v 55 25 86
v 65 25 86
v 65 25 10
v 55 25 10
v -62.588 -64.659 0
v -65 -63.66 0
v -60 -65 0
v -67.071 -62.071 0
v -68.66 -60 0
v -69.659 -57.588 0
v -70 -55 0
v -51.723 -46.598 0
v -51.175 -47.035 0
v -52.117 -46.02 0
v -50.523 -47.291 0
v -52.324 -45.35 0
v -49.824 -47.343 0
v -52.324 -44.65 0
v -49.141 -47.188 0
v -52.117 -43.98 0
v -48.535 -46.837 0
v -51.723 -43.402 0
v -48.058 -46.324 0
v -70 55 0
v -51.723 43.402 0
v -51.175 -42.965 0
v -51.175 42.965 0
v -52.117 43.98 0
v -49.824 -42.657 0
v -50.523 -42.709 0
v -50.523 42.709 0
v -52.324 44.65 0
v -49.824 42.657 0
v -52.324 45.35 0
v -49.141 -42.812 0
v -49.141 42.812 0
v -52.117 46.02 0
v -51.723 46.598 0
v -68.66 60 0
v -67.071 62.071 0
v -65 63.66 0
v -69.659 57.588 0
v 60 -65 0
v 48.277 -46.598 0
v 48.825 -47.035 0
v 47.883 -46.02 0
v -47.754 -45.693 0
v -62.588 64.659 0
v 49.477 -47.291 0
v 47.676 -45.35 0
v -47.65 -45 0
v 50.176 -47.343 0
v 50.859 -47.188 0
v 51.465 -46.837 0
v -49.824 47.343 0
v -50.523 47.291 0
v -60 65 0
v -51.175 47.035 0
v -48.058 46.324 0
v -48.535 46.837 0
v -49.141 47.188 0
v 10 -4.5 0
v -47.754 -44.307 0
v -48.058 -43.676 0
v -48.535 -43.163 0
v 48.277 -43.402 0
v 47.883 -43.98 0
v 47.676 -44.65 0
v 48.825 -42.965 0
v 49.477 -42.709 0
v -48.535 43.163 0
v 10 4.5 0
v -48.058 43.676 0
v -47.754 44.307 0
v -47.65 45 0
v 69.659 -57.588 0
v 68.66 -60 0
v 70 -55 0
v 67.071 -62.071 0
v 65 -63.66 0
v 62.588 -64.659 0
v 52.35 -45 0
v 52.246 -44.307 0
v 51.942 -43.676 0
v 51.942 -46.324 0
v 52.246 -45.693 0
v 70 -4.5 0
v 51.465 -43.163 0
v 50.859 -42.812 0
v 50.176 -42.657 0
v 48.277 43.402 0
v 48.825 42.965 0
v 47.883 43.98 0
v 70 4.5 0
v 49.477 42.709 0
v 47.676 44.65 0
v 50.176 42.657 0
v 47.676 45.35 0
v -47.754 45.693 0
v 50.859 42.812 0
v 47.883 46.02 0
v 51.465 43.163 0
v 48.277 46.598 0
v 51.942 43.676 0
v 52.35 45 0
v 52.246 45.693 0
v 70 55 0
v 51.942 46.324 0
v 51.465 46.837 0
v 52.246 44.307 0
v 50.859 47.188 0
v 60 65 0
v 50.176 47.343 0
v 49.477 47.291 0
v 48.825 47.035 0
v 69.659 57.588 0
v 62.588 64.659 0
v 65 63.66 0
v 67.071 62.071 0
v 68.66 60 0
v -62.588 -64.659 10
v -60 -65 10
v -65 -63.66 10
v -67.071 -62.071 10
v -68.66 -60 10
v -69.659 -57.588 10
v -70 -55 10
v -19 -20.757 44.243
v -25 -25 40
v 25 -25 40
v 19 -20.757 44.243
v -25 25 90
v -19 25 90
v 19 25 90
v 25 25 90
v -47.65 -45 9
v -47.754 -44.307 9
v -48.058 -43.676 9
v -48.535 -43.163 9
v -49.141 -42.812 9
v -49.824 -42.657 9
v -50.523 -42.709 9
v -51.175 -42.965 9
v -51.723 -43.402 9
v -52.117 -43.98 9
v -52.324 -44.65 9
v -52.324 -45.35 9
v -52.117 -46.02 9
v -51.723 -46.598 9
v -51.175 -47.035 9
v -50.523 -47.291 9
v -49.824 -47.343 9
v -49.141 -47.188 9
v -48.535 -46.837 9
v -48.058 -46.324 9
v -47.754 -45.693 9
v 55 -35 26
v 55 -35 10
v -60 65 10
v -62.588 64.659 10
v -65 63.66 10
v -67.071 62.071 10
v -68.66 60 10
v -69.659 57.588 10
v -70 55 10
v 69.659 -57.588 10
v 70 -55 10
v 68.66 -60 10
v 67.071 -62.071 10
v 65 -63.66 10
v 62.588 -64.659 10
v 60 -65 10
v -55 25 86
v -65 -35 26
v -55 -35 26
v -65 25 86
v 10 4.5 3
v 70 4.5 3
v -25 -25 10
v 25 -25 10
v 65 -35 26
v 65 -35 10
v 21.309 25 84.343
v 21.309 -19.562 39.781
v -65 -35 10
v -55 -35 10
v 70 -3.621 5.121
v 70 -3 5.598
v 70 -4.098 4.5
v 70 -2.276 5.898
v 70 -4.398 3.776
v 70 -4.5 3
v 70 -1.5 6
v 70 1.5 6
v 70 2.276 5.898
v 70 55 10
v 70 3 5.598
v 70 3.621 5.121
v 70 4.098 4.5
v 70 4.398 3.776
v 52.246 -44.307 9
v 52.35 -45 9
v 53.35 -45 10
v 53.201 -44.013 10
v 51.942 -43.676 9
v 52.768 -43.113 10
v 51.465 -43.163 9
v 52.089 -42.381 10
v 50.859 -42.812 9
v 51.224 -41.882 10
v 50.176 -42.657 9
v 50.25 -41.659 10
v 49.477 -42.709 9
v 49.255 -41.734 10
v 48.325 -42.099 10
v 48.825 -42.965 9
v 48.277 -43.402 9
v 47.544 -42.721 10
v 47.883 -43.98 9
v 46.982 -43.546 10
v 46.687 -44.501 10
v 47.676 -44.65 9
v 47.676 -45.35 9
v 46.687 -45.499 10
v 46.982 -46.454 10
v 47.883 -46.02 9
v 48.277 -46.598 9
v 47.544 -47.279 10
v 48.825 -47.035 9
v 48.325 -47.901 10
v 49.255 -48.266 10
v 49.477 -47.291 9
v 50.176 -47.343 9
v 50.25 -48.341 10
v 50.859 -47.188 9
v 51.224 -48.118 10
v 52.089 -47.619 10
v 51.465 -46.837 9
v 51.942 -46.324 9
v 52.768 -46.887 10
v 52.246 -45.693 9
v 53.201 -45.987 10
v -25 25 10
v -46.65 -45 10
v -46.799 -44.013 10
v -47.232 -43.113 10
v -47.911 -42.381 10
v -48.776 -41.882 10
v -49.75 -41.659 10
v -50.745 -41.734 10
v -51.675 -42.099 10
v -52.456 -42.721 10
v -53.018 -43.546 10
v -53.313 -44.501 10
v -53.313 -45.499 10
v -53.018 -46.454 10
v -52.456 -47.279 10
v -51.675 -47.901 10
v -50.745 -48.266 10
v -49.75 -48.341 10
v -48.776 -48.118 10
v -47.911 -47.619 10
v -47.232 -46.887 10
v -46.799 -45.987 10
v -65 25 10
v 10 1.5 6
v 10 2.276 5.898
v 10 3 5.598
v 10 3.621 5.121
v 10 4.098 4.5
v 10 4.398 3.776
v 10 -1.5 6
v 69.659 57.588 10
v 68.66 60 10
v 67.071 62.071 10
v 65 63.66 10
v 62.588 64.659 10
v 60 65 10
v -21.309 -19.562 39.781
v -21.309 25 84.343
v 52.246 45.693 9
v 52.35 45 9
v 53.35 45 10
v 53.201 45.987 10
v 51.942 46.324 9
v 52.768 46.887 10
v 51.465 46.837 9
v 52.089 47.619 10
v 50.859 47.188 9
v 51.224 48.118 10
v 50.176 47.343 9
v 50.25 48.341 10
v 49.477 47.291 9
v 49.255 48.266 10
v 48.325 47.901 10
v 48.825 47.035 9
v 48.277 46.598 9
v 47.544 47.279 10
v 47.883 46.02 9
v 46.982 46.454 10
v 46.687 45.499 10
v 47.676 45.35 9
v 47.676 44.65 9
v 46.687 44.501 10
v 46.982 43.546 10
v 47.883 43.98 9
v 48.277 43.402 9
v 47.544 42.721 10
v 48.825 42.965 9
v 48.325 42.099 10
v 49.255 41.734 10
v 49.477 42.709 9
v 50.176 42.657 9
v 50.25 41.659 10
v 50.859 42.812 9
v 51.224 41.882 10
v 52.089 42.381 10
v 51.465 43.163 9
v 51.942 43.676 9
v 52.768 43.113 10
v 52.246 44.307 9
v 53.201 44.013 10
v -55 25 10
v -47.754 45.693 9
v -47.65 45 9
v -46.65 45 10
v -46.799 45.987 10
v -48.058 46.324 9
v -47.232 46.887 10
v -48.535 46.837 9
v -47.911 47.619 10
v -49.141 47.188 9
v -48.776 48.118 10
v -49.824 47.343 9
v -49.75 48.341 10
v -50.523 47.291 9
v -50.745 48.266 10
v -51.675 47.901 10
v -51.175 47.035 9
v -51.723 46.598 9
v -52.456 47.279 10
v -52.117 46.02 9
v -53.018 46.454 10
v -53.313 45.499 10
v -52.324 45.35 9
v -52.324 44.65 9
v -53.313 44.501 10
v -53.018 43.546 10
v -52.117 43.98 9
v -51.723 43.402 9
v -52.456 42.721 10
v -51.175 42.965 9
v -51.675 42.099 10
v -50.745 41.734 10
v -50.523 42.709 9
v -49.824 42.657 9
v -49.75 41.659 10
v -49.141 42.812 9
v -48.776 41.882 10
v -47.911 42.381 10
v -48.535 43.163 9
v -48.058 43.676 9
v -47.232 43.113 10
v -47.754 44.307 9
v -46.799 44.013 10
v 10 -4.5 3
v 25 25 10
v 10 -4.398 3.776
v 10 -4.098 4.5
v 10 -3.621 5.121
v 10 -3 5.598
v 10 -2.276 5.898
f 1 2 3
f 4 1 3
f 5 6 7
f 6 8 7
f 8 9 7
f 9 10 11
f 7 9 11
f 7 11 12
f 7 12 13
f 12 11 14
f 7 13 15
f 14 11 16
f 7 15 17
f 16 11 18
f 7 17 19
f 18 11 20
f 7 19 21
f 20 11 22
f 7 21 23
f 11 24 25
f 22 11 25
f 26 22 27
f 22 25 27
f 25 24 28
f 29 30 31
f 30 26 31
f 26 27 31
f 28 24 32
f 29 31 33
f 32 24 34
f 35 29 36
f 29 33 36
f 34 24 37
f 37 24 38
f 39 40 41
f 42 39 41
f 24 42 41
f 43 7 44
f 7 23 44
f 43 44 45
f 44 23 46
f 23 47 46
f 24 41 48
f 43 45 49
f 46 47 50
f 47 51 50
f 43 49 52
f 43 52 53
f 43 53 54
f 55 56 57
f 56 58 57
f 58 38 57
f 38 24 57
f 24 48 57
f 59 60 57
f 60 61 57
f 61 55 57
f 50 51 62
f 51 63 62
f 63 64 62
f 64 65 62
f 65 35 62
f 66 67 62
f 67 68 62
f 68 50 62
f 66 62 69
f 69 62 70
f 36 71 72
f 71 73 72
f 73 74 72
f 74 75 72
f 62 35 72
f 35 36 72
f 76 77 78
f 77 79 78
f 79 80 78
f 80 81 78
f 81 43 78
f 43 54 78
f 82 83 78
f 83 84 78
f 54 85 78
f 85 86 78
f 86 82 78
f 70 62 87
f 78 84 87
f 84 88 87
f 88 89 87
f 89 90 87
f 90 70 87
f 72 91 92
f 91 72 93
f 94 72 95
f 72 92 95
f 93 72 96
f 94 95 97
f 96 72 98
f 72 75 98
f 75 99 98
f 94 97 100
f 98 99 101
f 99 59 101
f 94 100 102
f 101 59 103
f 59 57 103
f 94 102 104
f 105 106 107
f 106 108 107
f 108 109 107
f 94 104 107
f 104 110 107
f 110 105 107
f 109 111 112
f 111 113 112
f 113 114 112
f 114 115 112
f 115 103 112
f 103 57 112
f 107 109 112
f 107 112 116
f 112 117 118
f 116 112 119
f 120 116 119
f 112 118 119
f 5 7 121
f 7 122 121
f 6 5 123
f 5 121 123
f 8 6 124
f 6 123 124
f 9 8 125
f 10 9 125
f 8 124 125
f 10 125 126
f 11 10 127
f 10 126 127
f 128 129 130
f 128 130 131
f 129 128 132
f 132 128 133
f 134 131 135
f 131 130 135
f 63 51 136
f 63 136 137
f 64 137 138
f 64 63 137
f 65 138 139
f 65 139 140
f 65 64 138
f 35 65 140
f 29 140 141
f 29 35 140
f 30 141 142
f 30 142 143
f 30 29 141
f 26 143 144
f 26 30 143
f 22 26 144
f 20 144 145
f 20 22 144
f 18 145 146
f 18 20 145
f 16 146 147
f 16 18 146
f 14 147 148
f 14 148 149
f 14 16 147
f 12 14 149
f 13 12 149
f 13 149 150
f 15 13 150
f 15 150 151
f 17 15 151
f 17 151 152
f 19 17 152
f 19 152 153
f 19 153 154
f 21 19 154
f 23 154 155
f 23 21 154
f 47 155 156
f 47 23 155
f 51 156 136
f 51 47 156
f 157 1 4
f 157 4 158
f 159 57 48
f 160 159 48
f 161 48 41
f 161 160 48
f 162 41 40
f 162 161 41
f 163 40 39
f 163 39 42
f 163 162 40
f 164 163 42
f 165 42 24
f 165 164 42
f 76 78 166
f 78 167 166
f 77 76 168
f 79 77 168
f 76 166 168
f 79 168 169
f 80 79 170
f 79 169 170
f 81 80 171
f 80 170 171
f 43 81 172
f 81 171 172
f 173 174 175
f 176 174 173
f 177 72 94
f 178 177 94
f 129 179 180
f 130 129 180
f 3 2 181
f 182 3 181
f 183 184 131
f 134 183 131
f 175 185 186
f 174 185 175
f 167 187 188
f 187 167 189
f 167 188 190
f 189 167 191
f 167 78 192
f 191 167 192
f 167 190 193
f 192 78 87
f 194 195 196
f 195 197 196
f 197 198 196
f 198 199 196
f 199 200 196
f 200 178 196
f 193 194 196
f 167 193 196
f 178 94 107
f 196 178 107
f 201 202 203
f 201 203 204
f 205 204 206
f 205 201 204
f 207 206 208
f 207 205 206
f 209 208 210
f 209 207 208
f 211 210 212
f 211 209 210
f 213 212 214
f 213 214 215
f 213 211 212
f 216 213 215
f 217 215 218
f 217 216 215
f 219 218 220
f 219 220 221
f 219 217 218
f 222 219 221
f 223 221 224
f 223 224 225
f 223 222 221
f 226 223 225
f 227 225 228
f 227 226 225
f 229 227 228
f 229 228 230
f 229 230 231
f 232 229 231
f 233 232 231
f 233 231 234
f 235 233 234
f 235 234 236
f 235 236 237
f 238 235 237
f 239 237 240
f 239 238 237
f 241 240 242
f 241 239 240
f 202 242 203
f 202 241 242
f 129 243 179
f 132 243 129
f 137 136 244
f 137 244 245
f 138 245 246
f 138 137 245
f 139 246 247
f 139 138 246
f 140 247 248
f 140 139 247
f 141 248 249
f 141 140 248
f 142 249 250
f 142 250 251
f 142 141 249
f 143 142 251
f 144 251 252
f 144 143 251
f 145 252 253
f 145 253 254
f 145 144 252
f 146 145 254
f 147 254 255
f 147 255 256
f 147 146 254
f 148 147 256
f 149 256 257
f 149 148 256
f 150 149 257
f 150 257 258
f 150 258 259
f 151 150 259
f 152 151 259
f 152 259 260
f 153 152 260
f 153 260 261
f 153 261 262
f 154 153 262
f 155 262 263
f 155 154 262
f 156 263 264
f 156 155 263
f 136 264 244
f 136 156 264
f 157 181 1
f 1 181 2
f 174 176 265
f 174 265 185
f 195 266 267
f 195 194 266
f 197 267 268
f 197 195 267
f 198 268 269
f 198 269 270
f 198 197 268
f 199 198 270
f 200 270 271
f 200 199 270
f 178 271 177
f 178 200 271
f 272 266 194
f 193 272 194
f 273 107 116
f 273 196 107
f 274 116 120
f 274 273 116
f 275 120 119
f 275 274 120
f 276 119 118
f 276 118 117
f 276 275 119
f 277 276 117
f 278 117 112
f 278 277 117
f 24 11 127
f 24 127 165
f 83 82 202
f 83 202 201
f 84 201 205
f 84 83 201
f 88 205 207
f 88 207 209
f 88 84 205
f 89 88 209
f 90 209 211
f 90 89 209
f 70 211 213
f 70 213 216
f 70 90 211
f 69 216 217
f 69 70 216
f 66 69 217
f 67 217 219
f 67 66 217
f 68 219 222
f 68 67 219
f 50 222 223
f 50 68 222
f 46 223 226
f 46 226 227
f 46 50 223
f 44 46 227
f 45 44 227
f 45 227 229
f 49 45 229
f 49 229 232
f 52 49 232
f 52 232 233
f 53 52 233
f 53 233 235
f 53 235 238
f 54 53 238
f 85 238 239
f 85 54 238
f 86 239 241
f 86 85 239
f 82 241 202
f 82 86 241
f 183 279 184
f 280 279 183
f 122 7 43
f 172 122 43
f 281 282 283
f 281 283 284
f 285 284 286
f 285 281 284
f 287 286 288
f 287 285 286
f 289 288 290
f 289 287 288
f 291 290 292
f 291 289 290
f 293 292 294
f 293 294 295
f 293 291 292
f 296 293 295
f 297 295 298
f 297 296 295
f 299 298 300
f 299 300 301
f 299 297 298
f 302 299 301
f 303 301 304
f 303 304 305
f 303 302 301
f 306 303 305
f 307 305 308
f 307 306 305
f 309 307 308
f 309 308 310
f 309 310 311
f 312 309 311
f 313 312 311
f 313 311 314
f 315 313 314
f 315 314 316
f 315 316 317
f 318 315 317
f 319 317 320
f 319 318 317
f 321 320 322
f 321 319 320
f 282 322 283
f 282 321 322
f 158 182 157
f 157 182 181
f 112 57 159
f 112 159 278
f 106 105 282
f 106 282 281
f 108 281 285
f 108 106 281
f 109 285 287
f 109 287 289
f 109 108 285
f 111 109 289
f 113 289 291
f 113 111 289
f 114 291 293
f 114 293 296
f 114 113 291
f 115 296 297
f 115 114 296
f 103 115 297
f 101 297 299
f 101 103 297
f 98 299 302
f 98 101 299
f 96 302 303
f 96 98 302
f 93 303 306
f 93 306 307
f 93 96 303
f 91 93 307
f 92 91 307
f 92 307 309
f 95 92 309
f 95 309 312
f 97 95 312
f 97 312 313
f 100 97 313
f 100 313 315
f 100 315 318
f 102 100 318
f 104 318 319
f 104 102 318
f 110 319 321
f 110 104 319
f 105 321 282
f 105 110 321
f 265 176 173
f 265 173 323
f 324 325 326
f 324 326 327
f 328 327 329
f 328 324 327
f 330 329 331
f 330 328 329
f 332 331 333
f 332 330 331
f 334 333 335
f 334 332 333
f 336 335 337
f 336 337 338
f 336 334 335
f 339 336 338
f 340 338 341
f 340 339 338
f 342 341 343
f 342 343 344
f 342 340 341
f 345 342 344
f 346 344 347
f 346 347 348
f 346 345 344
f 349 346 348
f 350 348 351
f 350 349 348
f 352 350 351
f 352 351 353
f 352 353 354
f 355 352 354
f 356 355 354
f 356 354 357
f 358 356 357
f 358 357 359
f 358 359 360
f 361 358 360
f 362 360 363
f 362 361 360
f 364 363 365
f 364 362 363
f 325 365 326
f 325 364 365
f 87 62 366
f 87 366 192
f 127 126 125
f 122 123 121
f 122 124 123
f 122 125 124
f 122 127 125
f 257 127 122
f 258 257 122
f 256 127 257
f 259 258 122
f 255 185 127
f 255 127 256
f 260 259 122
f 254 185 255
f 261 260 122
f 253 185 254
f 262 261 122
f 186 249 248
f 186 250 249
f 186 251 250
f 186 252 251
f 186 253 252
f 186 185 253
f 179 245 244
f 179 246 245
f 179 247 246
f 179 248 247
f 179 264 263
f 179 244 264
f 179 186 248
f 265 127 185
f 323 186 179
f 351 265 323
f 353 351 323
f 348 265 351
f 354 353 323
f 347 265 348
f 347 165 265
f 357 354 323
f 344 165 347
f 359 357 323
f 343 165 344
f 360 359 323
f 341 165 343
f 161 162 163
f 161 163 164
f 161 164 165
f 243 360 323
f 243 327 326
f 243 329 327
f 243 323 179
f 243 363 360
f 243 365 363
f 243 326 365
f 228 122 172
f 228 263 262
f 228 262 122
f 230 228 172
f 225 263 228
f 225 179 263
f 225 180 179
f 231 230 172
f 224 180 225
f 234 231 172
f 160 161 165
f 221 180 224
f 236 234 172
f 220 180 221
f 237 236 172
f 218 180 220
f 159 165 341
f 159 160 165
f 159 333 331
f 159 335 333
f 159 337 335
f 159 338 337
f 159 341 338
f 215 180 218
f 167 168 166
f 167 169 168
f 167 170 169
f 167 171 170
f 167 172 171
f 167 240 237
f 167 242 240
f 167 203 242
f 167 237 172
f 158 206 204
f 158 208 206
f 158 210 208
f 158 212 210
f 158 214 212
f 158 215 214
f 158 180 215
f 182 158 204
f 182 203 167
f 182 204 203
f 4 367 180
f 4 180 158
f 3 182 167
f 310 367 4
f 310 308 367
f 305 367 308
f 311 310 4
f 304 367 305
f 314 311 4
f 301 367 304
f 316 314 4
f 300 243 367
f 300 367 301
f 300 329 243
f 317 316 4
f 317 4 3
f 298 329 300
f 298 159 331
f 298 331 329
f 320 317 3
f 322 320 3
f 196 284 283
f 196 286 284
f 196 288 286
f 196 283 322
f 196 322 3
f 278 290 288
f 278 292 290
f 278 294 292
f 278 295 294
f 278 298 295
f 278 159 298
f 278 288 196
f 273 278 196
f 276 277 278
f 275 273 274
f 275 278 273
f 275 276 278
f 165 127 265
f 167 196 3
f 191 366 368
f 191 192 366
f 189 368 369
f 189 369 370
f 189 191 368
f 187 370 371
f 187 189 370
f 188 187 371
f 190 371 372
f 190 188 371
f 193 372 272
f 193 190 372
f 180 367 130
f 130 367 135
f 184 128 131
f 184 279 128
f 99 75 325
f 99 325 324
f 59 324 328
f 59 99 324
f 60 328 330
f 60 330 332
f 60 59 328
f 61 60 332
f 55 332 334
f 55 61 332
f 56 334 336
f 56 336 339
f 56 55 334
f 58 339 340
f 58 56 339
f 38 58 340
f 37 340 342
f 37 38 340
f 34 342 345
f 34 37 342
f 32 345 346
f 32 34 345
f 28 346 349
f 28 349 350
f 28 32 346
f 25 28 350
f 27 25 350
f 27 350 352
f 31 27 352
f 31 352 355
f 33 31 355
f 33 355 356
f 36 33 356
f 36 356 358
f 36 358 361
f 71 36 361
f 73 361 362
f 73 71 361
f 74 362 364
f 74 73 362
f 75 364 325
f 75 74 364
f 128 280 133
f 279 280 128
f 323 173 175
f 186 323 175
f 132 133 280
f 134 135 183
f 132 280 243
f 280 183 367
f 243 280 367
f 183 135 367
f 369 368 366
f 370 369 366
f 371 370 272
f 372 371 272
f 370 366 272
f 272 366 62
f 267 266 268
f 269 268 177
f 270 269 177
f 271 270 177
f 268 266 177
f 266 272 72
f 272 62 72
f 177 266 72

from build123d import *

# Parameters (mm, degrees)
SKETCH_W        = 140
SKETCH_H        = 130
SKETCH_R        = 2.35
PAD_DEPTH       = 10
SKETCH001_W     = 50
SKETCH001_H     = 50
PAD001_DEPTH    = 30
PAD002_DEPTH    = 50
FILLET_R        = 10
CHAMFER_SIZE    = 1
SKETCH003_W     = 38
SKETCH003_H     = 64.710678
POCKET_DEPTH    = 4
POCKET_TAPER    = -30
PAD003_DEPTH    = 10
SKETCH005_W     = 60
SKETCH005_H     = 9
POCKET001_DEPTH = 6
FILLET001_R     = 3


with BuildPart() as part:
    # Sketch → Pad (new body)
    with BuildSketch(Plane.XY):
        Rectangle(SKETCH_W, SKETCH_H)
        with Locations((-50, 45)):
            Circle(SKETCH_R, mode=Mode.SUBTRACT)
        with Locations((50, 45)):
            Circle(SKETCH_R, mode=Mode.SUBTRACT)
        with Locations((-50, -45)):
            Circle(SKETCH_R, mode=Mode.SUBTRACT)
        with Locations((50, -45)):
            Circle(SKETCH_R, mode=Mode.SUBTRACT)
    extrude(amount=PAD_DEPTH)

    # Sketch001 (on Face10 of Pad) → Pad001 (join)
    with BuildSketch(Plane.XY.offset(10)):
        Rectangle(SKETCH001_W, SKETCH001_H)
    extrude(amount=PAD001_DEPTH)

    # Sketch002 (on DatumPlane) → Pad002 (join)
    with BuildSketch(Plane.YZ.offset(25)):
        Polygon((-25, 40), (25, 90), (25, 40), align=None)
    extrude(amount=-PAD002_DEPTH)

    # Fillet
    fillet_edges = [part.edges().sort_by_distance(p)[0] for p in [
        (70, -65, 5),
        (70, 65, 5),
        (-70, -65, 5),
        (-70, 65, 5),
    ]]
    fillet(fillet_edges, radius=FILLET_R)

    # Chamfer
    chamfer_edges = [part.edges().sort_by_distance(p)[0] for p in [
        (-52.35, -45, 10),
        (47.65, -45, 10),
        (47.65, 45, 10),
        (-52.35, 45, 10),
    ]]
    chamfer(chamfer_edges, length=CHAMFER_SIZE)

    # Sketch003 (on Face21 of Chamfer) → Pocket (cut)
    with BuildSketch(Plane(origin=(0, -32.5, 32.5), x_dir=(1, 0, 0), z_dir=(0, -0.707107, 0.707107))):
        with Locations((0, 48.961941)):
            Rectangle(SKETCH003_W, SKETCH003_H)
    extrude(amount=-POCKET_DEPTH, taper=POCKET_TAPER, mode=Mode.SUBTRACT)

    # Sketch004 → Pad003 (join)
    with BuildSketch(Plane.YZ.offset(-65)):
        Polygon((-35, 10), (-35, 26), (25, 86), (25, 10), align=None)
    pad003 = extrude(amount=PAD003_DEPTH)

    # Mirrored: Pad003 across YZ
    add(pad003.mirror(Plane.YZ))

    # Sketch005 → Pocket001 (cut)
    with BuildSketch(Plane.XY):
        with Locations((40, 0)):
            Rectangle(SKETCH005_W, SKETCH005_H)
    extrude(amount=POCKET001_DEPTH, mode=Mode.SUBTRACT)

    # Fillet001
    fillet001_edges = [part.edges().sort_by_distance(p)[0] for p in [
        (40, 4.5, 6),
        (40, -4.5, 6),
    ]]
    fillet(fillet001_edges, radius=FILLET001_R)


solid = part.part
